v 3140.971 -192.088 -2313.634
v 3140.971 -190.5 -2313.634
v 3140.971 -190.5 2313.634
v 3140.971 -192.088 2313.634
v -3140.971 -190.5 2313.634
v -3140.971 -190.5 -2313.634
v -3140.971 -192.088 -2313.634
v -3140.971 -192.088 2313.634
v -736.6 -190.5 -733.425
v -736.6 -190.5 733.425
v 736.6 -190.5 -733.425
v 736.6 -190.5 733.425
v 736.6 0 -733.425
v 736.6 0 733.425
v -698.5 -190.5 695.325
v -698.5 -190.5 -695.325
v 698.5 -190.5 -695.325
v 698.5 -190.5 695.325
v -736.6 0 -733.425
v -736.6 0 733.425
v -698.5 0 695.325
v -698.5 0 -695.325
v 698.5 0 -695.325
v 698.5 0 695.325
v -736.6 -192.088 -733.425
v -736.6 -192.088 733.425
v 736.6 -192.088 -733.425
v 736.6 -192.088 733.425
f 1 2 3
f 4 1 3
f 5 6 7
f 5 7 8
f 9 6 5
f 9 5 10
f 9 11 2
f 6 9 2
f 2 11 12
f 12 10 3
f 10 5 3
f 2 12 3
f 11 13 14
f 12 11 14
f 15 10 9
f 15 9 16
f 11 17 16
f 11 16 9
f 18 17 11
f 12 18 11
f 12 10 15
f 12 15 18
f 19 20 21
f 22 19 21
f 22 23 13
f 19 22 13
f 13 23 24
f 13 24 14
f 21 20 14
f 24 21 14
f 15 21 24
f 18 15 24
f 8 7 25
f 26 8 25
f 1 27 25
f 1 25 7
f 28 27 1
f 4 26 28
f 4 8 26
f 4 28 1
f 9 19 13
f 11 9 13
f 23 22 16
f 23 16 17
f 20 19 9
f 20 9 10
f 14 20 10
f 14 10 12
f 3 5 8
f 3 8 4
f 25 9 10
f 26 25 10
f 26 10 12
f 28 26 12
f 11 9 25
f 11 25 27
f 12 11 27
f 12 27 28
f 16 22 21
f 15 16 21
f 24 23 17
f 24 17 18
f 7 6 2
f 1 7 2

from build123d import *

# Parameters (mm, degrees)
F0_W     = 1473.2
F0_H     = 1466.85
F0_W_2   = 1397
F0_H_2   = 1390.65
F1_DEPTH = 190.5
F2_W     = 6281.9428443909
F2_H     = 4627.2683143616
F2_W_2   = 1473.2
F2_H_2   = 1466.85
F3_DEPTH = 1.5875


with BuildPart() as f1:
    # F0 (on Front) → F1 (new body)
    with BuildSketch(Plane.XZ):
        Rectangle(F0_W, F0_H)
        Rectangle(F0_W_2, F0_H_2, mode=Mode.SUBTRACT)
    extrude(amount=F1_DEPTH)


with BuildPart() as f3:
    # F2 (on face) → F3 (new body)
    with BuildSketch(Plane.XZ.offset(190.5)):
        Rectangle(F2_W, F2_H)
        Rectangle(F2_W_2, F2_H_2, mode=Mode.SUBTRACT)
    extrude(amount=F3_DEPTH)


solid = Compound([f1.part, f3.part])
